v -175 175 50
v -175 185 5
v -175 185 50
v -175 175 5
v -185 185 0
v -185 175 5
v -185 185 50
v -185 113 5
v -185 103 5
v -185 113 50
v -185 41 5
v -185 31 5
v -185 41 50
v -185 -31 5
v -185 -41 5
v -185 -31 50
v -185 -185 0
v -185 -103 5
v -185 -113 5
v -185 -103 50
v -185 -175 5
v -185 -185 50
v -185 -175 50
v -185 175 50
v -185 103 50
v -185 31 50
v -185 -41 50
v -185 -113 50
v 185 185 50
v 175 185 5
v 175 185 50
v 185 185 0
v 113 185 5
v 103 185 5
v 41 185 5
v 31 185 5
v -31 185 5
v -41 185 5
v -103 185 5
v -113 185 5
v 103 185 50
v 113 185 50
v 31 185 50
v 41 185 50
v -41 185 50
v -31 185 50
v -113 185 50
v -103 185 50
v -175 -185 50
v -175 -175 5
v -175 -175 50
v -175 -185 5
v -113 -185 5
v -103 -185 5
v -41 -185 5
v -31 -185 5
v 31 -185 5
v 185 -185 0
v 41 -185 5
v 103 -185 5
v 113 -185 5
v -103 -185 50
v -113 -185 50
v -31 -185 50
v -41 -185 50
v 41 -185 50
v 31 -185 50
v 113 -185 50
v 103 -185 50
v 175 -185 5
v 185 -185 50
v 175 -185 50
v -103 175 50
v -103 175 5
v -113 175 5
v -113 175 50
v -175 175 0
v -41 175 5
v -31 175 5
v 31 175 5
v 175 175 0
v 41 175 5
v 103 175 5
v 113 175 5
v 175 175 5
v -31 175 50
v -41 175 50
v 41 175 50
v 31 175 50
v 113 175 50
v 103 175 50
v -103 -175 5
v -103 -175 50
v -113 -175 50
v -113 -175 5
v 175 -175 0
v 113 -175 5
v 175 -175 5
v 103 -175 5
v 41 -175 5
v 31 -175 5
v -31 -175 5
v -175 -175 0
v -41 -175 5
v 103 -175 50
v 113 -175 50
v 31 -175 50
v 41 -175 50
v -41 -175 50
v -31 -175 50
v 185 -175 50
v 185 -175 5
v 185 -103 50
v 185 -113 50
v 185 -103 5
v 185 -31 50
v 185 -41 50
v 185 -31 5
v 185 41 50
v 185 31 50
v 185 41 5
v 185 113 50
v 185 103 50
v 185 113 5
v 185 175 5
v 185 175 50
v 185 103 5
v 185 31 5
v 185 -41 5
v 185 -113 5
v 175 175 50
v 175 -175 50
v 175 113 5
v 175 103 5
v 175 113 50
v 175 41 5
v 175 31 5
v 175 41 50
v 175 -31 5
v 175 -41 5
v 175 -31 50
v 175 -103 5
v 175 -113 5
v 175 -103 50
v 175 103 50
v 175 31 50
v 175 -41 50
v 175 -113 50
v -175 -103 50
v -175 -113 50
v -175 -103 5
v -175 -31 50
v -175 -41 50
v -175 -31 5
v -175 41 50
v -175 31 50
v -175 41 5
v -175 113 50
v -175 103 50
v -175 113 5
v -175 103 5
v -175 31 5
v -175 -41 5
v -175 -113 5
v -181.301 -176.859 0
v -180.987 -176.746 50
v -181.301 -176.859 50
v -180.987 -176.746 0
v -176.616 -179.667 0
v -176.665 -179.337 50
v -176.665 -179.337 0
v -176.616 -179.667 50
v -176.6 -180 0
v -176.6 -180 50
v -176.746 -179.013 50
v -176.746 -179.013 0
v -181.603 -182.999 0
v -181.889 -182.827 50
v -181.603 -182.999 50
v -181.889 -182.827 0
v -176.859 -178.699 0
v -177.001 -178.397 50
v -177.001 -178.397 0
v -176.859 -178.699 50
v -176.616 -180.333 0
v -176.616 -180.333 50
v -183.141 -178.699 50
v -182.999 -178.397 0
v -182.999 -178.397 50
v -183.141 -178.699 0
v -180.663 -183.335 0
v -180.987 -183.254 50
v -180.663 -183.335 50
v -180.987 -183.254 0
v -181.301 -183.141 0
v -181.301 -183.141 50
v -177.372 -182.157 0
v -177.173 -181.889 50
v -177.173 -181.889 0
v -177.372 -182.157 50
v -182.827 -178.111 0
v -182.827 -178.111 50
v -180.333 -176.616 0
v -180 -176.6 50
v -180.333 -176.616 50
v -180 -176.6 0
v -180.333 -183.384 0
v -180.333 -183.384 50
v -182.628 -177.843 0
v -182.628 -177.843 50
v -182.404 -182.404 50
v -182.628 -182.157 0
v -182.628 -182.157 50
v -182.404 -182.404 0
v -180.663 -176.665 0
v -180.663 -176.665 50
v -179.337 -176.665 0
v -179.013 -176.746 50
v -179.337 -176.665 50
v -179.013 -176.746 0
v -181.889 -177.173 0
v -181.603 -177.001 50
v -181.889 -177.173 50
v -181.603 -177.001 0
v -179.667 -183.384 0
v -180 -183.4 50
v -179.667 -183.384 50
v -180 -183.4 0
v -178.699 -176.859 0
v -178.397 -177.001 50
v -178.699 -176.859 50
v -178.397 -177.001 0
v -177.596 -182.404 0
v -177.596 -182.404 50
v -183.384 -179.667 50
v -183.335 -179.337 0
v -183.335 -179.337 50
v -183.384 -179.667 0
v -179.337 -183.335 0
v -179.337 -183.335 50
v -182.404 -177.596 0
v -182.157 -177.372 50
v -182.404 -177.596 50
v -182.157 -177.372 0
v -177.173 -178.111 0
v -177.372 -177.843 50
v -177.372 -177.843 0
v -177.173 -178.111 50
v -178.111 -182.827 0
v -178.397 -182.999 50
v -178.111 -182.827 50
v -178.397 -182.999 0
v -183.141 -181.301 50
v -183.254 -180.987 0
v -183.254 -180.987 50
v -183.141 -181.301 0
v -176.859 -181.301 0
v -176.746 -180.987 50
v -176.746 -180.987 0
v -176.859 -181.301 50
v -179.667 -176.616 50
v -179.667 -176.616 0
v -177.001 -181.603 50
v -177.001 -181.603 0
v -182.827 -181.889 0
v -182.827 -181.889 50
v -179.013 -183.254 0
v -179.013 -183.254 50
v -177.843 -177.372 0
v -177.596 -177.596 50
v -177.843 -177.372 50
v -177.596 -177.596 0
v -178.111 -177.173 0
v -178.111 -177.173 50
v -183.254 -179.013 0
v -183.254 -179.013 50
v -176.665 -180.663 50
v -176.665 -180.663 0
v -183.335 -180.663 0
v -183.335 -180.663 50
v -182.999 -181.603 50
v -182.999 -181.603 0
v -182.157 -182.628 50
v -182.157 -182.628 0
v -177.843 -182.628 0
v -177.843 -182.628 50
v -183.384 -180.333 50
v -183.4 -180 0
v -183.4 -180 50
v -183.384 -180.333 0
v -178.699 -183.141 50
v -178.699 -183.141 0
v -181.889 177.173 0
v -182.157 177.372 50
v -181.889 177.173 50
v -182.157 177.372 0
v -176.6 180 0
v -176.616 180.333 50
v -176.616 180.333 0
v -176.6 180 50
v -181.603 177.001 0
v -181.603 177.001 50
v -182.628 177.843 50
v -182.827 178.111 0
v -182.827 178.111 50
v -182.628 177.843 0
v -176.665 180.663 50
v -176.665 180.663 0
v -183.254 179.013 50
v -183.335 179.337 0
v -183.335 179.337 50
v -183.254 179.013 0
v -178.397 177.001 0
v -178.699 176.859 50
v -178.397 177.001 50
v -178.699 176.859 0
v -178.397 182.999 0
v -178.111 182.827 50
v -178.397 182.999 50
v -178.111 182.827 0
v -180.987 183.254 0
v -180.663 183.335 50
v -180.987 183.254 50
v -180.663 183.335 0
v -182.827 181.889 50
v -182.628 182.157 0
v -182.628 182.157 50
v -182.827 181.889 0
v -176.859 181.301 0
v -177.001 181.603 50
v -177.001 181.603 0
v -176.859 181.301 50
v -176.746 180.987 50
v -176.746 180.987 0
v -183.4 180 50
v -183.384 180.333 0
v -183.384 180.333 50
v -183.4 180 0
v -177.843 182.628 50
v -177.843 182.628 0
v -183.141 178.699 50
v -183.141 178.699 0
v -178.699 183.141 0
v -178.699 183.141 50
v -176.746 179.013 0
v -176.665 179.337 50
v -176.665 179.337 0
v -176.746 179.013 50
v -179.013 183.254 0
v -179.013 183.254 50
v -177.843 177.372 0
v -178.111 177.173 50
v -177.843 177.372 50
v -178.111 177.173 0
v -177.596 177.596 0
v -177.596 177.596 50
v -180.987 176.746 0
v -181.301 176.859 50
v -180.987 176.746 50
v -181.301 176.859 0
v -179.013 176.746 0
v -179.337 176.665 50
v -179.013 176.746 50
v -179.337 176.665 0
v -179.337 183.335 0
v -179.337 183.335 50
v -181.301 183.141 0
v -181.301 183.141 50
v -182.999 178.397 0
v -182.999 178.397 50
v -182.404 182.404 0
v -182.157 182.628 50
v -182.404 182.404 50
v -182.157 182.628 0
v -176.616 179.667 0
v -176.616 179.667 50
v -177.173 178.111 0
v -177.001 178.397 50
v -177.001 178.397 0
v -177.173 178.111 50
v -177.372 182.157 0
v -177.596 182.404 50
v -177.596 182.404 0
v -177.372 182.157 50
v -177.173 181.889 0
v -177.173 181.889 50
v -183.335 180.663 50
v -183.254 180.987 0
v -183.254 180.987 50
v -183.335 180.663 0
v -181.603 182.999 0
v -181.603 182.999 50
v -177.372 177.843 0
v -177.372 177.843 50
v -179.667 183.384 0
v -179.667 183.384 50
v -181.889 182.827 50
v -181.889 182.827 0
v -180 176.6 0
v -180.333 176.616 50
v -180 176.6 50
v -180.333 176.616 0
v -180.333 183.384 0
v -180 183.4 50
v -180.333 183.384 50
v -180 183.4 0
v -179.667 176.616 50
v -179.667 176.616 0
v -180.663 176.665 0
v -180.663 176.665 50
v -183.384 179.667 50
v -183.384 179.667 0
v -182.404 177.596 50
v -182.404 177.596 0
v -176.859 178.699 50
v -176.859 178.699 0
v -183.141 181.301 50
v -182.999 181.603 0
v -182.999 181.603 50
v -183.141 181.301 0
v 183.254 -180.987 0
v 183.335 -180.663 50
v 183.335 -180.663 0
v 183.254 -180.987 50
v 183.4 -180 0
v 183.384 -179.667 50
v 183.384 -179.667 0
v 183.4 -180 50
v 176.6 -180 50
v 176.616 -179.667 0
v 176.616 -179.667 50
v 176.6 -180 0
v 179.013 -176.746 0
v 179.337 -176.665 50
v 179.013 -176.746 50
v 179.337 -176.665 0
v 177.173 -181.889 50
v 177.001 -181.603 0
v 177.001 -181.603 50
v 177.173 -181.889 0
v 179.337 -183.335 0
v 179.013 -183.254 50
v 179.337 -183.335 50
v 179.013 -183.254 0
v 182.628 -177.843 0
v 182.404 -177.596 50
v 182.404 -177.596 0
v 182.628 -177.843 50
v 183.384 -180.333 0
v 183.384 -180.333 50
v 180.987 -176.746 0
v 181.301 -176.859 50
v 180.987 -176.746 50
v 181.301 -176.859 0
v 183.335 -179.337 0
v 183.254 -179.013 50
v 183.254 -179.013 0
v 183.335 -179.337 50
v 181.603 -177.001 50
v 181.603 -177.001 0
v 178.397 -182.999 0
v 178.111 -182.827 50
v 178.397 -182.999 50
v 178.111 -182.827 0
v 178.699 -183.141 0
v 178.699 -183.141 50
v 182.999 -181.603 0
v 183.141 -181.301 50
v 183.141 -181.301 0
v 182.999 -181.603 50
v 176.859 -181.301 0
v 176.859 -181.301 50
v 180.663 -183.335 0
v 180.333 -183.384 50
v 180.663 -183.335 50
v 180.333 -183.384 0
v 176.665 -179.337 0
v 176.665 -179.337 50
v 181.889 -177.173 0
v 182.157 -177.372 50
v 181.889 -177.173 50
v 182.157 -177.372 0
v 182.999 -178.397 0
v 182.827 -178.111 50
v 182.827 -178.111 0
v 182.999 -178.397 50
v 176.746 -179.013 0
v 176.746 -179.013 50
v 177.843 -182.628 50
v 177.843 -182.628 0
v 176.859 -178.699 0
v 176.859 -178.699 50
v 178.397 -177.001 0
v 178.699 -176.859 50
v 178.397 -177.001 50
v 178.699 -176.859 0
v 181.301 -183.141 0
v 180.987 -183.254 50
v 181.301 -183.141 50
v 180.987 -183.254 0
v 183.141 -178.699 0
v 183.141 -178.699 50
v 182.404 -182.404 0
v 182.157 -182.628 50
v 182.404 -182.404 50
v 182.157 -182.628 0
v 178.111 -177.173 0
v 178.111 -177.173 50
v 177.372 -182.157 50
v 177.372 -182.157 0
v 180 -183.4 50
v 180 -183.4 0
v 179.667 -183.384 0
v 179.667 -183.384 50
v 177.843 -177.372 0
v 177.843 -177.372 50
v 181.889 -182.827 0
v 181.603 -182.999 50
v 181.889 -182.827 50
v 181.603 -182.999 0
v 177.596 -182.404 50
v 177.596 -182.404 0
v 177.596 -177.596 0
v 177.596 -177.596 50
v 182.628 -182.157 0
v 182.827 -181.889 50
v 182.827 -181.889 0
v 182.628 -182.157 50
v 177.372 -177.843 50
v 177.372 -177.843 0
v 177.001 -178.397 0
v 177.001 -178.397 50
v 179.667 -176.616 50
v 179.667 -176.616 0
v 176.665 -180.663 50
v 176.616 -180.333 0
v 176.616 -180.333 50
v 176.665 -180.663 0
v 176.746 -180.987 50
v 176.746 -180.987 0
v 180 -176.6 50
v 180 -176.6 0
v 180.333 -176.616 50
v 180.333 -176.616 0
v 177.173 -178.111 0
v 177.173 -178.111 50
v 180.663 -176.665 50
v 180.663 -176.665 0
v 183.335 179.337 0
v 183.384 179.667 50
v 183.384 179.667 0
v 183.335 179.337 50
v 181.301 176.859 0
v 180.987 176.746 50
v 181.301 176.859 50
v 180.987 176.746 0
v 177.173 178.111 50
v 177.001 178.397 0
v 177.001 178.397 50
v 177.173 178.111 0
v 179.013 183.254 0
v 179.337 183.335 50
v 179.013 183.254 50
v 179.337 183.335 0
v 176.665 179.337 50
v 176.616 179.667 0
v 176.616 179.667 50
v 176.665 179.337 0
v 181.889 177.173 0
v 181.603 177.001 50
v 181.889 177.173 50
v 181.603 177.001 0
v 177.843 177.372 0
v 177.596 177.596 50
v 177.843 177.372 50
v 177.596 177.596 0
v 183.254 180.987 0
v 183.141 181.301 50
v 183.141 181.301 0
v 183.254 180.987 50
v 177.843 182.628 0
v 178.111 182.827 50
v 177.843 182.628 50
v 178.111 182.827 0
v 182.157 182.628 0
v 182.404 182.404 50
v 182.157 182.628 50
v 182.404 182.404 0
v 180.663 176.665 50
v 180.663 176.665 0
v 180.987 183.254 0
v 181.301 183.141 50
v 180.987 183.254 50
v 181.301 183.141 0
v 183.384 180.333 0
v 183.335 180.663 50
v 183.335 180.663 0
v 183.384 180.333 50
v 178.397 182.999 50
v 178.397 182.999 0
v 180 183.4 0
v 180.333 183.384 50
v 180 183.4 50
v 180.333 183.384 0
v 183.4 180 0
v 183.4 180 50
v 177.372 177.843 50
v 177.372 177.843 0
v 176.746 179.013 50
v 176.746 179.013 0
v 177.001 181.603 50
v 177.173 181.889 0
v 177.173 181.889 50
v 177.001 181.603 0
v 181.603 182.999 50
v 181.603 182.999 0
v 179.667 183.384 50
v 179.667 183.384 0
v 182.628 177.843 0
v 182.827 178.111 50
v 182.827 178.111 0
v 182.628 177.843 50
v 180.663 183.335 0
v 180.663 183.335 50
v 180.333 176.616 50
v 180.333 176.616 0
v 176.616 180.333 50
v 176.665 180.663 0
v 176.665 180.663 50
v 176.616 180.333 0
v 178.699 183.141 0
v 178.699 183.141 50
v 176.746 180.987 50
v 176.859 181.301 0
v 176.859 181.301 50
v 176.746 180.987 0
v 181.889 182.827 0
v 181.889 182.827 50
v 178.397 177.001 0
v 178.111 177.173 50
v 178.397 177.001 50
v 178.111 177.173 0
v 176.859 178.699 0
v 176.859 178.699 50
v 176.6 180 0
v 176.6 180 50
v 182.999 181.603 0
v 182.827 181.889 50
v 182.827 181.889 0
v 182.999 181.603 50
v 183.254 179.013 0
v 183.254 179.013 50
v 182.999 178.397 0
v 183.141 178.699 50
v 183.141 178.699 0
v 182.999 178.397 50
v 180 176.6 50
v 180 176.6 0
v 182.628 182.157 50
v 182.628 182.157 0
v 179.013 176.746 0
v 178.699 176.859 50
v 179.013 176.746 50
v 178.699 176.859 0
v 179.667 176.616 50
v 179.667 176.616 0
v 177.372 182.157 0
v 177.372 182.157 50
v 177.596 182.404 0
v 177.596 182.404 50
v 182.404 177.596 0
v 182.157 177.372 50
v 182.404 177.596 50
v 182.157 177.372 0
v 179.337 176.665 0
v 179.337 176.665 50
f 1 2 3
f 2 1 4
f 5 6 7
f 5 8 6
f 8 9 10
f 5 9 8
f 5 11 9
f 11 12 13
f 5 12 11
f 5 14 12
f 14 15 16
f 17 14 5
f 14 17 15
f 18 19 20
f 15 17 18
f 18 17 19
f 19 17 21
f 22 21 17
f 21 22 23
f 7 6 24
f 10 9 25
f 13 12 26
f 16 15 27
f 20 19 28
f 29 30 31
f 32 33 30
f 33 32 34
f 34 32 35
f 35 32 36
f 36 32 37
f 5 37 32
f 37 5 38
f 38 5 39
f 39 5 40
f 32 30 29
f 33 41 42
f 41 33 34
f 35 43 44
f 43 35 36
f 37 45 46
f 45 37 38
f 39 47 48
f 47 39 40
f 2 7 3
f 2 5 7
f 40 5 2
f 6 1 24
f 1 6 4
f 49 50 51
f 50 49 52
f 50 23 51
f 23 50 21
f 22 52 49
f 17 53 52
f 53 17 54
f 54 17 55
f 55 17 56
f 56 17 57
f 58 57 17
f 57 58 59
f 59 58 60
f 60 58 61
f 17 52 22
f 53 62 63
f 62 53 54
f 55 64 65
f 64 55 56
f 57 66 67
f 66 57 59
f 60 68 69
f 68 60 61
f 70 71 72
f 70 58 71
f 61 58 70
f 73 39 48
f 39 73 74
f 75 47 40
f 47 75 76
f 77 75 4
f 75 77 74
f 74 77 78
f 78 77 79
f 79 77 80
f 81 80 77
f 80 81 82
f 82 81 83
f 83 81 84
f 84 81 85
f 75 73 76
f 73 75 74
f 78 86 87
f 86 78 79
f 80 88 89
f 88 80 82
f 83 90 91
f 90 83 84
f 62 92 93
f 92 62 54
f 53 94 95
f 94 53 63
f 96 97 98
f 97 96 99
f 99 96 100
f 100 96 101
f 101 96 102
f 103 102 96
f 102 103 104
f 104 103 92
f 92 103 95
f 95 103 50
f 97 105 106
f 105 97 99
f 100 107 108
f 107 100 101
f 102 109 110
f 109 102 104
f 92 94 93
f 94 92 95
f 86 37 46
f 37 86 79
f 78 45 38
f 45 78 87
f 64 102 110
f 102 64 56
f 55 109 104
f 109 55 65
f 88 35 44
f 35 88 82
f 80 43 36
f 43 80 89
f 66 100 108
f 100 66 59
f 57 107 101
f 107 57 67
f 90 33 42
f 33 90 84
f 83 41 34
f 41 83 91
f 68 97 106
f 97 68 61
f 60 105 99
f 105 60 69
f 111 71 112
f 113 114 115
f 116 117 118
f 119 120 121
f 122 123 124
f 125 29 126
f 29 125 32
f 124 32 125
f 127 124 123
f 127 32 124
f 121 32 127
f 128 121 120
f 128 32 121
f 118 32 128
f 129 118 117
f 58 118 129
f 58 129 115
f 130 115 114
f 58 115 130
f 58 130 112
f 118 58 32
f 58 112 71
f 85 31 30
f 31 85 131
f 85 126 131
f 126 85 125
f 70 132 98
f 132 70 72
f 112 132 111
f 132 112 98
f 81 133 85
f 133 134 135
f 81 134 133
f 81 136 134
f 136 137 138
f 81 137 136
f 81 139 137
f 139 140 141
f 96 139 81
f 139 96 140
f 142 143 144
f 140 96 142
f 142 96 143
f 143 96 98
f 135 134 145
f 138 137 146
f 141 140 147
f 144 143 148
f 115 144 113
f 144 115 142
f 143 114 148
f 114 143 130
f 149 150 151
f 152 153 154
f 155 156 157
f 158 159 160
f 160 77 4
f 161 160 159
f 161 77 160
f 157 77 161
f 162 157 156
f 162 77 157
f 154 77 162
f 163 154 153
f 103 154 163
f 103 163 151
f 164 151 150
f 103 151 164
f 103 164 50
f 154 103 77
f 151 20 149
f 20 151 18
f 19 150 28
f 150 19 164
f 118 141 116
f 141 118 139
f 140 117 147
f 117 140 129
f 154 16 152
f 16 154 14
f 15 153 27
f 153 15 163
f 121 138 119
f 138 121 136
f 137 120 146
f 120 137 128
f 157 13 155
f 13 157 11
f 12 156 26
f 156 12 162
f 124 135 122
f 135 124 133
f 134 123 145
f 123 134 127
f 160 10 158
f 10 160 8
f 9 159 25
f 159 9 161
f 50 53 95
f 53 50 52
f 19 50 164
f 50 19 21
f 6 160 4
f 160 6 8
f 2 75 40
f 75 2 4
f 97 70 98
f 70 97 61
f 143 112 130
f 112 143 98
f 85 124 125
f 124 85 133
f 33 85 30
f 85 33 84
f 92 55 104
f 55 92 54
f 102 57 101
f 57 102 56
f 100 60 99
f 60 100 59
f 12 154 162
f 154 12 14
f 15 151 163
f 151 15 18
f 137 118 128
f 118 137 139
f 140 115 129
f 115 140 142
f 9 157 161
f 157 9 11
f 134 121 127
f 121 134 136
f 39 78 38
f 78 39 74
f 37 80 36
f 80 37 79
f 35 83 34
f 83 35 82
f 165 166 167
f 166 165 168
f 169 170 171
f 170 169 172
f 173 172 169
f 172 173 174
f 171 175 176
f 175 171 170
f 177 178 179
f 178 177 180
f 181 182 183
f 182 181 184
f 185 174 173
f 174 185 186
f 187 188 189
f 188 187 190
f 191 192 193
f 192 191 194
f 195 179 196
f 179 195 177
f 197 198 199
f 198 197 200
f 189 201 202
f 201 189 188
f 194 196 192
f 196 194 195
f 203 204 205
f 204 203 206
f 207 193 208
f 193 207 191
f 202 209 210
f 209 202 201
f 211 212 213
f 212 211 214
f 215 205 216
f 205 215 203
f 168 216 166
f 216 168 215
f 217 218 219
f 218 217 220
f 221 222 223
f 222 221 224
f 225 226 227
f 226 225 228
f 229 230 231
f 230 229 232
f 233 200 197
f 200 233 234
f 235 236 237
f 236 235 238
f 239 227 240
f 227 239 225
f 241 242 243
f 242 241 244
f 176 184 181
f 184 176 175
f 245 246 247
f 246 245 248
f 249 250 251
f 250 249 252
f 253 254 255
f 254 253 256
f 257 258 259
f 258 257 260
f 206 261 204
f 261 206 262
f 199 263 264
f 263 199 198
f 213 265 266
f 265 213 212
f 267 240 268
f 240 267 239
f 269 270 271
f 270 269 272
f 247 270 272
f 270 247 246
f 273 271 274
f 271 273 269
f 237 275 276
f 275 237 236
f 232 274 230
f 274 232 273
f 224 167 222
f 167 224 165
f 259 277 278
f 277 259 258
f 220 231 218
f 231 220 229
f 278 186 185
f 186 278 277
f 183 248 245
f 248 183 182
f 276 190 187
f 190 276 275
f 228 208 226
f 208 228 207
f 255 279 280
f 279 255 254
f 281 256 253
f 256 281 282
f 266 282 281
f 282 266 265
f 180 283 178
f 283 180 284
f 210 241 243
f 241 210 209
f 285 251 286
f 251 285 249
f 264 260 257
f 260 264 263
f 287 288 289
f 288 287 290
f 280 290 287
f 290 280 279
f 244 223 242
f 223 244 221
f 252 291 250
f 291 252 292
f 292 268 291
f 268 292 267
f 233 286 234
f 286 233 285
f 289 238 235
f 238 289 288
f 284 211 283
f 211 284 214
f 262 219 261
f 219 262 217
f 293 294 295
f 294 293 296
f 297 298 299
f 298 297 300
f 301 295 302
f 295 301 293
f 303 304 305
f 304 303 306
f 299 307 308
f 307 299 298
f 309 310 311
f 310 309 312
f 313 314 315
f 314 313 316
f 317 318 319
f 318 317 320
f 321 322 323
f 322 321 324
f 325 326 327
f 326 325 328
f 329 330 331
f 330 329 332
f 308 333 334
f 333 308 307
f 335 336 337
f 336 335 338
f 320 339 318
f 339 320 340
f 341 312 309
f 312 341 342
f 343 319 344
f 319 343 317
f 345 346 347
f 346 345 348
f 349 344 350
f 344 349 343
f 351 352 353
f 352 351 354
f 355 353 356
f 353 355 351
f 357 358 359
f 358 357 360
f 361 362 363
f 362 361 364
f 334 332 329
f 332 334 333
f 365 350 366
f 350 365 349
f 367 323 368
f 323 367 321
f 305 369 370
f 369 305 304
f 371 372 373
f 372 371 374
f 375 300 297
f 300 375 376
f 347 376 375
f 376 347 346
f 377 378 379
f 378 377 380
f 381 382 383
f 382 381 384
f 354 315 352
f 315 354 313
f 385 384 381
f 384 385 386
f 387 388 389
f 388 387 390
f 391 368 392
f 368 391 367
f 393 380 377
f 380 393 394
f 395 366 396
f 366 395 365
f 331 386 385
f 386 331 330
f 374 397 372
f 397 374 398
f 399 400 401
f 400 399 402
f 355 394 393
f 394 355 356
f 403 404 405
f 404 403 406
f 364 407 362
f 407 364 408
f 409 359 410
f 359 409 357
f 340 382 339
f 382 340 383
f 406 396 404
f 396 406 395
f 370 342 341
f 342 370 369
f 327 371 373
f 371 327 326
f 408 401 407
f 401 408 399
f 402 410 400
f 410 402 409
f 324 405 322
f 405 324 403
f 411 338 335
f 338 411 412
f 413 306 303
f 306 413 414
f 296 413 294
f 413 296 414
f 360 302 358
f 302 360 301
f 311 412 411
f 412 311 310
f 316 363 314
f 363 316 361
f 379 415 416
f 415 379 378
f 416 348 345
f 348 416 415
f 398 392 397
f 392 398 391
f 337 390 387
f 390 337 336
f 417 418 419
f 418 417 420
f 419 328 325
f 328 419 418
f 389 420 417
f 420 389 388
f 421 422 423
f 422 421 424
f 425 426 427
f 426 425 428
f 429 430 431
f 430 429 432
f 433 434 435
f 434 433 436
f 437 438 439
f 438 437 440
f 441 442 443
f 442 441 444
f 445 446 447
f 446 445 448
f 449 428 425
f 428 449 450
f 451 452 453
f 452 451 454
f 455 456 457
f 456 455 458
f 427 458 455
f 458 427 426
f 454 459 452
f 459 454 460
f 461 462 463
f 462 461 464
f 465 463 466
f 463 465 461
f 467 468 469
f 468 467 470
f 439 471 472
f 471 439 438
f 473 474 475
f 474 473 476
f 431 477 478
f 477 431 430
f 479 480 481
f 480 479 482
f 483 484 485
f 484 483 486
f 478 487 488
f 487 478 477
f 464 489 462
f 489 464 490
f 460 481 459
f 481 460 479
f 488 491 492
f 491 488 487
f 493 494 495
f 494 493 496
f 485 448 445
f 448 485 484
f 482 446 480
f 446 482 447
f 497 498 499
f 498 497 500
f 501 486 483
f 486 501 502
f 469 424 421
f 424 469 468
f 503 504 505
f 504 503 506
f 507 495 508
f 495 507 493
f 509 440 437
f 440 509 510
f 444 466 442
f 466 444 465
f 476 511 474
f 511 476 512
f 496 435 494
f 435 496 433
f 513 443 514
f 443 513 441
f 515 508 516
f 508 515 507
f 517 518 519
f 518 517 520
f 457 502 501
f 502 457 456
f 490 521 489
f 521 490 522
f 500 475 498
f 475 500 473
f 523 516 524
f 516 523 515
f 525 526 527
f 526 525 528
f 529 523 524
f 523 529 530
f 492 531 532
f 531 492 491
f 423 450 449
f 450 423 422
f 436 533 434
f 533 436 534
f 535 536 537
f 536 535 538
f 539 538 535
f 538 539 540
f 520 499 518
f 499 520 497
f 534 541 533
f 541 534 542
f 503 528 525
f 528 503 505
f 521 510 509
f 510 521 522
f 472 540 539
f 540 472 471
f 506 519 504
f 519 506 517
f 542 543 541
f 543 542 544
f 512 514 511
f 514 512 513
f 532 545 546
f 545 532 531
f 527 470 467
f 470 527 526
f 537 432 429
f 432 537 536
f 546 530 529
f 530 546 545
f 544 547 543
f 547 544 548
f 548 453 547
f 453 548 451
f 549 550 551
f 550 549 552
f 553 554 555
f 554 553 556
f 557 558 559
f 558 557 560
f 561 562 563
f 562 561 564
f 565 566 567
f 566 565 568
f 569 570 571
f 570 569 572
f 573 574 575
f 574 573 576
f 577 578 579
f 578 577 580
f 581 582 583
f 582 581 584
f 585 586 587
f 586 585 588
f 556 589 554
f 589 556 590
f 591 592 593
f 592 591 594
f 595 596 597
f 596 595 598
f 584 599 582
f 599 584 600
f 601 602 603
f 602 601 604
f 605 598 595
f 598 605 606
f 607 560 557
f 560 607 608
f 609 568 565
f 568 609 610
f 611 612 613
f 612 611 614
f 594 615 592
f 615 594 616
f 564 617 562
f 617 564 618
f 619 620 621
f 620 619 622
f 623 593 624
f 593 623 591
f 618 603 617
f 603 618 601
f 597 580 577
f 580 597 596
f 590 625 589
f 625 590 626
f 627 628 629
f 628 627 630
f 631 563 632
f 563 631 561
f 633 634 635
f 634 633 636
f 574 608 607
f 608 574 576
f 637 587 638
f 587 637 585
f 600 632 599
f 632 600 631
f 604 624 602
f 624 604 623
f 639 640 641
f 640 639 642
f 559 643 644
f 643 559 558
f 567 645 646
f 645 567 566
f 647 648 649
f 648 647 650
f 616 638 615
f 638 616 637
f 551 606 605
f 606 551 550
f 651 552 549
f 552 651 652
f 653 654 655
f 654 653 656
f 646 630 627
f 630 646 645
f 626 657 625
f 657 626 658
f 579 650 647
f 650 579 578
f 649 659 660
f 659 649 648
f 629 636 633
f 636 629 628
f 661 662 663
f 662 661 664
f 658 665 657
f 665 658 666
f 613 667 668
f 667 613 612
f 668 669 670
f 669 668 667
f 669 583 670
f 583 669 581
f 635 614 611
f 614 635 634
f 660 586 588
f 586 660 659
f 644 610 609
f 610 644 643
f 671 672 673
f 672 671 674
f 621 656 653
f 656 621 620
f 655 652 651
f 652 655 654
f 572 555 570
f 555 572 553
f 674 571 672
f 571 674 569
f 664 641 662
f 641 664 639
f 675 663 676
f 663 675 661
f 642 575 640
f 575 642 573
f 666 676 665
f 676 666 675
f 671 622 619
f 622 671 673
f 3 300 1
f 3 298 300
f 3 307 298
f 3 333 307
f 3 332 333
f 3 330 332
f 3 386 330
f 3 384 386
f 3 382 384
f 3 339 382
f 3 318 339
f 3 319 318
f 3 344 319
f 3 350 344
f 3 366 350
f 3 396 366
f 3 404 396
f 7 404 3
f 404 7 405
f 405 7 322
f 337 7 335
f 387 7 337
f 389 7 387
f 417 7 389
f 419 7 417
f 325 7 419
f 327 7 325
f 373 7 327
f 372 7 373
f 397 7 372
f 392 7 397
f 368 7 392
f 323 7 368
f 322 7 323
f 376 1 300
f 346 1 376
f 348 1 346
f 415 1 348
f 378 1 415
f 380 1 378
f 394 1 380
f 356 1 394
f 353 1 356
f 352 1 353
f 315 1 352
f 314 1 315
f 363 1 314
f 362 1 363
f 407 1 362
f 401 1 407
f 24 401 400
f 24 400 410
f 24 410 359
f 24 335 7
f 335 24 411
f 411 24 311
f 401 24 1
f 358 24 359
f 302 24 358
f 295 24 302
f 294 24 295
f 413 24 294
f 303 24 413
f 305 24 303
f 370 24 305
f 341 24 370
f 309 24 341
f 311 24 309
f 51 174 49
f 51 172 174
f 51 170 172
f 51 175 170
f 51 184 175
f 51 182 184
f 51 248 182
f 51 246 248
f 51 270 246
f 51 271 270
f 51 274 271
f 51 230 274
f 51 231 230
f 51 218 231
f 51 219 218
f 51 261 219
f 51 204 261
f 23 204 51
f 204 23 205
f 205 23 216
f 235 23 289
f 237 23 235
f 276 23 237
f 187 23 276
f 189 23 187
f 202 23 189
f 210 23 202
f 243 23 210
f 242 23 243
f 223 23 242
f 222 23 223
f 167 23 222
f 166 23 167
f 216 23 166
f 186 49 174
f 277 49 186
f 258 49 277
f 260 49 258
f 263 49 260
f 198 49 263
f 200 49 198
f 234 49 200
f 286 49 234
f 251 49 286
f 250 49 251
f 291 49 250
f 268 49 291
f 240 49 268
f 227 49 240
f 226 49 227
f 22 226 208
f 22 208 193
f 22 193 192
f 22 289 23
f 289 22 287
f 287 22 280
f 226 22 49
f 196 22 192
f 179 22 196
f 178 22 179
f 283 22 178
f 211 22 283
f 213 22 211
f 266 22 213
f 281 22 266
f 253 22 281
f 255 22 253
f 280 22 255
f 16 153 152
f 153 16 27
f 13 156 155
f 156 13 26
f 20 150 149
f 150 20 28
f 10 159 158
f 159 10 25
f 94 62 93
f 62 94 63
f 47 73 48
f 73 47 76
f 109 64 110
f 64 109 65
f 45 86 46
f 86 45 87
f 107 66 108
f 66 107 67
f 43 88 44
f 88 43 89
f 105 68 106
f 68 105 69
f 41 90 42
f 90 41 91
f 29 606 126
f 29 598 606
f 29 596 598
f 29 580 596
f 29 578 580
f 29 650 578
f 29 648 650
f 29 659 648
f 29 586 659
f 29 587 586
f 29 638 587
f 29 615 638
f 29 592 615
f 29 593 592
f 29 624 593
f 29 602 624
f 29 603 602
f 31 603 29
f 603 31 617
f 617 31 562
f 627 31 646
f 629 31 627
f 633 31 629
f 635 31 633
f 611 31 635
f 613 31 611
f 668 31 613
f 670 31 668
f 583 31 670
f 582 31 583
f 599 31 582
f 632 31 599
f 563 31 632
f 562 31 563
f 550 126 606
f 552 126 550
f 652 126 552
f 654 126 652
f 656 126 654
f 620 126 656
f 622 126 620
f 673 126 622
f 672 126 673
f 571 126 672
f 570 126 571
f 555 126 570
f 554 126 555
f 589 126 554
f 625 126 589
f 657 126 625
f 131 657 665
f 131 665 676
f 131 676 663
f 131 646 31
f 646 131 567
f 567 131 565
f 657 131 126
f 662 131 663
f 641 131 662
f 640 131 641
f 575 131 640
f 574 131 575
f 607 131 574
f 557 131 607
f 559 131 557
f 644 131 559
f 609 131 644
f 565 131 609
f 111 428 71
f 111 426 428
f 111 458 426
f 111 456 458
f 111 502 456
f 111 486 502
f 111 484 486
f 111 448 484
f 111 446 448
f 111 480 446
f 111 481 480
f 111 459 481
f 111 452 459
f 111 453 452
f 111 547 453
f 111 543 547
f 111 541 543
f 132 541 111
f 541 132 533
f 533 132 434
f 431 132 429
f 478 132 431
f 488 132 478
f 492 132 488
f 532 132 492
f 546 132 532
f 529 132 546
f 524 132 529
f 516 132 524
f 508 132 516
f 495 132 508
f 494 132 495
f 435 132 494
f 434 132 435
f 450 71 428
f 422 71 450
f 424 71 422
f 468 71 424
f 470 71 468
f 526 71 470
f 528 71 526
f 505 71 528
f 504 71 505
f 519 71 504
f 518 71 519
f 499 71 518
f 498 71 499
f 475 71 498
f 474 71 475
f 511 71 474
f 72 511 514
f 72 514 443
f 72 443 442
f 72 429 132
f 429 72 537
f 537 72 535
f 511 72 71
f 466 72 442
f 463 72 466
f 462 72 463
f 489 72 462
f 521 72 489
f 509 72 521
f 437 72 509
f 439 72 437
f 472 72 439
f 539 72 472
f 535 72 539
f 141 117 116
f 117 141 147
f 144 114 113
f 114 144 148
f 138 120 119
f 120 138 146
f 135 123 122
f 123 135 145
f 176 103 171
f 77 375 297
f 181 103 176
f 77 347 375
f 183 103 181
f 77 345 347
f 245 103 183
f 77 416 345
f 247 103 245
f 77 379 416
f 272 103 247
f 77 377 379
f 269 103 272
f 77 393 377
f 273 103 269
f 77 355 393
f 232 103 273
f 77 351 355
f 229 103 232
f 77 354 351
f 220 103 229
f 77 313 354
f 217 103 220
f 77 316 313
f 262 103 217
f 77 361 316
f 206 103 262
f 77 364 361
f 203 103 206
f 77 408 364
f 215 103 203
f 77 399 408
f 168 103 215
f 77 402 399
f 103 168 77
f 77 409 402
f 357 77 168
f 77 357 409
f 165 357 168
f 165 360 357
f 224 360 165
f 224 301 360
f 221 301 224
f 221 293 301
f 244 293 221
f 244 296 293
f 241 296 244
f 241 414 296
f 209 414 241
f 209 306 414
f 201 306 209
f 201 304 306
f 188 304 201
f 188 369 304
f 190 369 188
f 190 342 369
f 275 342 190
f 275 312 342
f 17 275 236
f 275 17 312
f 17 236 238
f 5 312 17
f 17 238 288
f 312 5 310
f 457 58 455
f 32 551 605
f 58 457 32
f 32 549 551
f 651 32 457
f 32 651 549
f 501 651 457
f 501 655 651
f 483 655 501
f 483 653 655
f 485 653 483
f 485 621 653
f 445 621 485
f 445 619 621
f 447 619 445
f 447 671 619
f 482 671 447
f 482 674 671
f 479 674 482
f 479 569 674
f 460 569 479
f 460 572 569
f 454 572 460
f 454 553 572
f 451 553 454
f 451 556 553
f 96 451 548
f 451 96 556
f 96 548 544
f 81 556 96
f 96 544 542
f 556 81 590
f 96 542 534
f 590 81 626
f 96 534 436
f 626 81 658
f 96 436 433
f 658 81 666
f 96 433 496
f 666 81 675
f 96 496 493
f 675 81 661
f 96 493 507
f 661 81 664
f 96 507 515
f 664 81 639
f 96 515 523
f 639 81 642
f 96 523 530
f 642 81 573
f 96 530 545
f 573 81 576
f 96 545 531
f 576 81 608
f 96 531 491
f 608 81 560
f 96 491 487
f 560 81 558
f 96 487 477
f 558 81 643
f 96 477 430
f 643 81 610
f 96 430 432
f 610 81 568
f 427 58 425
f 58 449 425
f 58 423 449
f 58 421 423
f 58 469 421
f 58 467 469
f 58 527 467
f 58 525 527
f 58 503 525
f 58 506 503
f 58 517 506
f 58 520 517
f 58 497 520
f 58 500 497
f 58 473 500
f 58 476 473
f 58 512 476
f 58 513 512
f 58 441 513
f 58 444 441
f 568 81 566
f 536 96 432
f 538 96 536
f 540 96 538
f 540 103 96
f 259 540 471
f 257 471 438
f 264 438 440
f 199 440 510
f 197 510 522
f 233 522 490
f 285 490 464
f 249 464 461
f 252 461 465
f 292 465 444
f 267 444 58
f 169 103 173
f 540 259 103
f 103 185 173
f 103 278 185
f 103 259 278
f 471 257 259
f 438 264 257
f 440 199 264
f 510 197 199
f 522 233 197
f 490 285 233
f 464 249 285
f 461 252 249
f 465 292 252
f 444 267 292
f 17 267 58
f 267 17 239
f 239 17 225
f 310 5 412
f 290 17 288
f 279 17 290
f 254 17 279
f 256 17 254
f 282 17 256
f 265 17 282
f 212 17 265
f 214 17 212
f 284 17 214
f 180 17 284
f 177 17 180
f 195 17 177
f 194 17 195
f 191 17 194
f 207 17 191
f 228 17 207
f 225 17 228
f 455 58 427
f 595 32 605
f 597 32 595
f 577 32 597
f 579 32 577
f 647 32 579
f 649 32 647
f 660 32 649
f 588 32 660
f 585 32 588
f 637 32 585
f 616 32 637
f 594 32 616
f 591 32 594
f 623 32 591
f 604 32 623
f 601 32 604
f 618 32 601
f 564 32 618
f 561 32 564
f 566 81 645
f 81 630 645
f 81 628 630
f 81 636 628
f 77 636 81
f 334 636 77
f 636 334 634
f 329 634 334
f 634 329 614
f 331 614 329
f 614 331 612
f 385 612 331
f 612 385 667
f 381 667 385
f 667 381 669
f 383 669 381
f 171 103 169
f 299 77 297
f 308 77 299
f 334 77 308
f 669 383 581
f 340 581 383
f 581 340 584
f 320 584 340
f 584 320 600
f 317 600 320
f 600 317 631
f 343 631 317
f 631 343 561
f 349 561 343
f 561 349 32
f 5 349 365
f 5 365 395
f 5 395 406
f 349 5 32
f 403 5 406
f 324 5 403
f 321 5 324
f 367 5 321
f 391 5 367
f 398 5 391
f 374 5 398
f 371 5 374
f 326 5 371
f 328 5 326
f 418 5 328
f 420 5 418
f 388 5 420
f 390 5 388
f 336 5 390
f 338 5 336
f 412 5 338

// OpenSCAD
// Cage slice part (z0..z1). Units: mm.
// Print orientation: normal

bar=10;
inner=[350,350,700];
gap_xy=62;
gap_z=61;
hole_d=6.8;
$fn=64;

outer=[inner[0]+2*bar, inner[1]+2*bar, inner[2]+2*bar];
half=[outer[0]/2, outer[1]/2, outer[2]/2];

pitch_xy=bar+gap_xy;
pitch_z=bar+gap_z;

centers=[for(i=[0:5]) -(half[0]-bar/2) + i*pitch_xy];
z_levels=[for(i=[0:10]) i*pitch_z];

module vbar(xc,yc){ translate([xc-bar/2,yc-bar/2,0]) cube([bar,bar,outer[2]],center=false); }
module hbar_x(yc,z0){ translate([-half[0],yc-bar/2,z0]) cube([outer[0],bar,bar],center=false); }
module hbar_y(xc,z0){ translate([xc-bar/2,-half[1],z0]) cube([bar,outer[1],bar],center=false); }

module grid(z0){ union(){ for(yc=centers) hbar_x(yc,z0); for(xc=centers) hbar_y(xc,z0); } }

module side_verticals(){
  union(){
    for(xc=centers){ vbar(xc, half[1]-bar/2); vbar(xc,-half[1]+bar/2); }
    for(yc=centers){ vbar( half[0]-bar/2,yc); vbar(-half[0]+bar/2,yc); }
  }
}

module side_rings(){
  union(){
    for(z0=z_levels){
      hbar_x( half[1]-bar/2,z0); hbar_x(-half[1]+bar/2,z0);
      hbar_y( half[0]-bar/2,z0); hbar_y(-half[0]+bar/2,z0);
    }
  }
}

module rod_holes(){
  for(sx=[-1,1],sy=[-1,1]) translate([sx*(half[0]-bar/2), sy*(half[1]-bar/2), -1]) cylinder(d=hole_d,h=outer[2]+2,center=false);
}

module cage(){ difference(){ union(){ side_verticals(); side_rings(); grid(0); grid(outer[2]-bar); } rod_holes(); } }

module cage_slice(zmin,zmax){ intersection(){ cage(); translate([-1000,-1000,zmin]) cube([2000,2000,zmax-zmin],center=false); } }

z0=147; z1=197;
translate([0,0,-z0]) cage_slice(z0,z1);
